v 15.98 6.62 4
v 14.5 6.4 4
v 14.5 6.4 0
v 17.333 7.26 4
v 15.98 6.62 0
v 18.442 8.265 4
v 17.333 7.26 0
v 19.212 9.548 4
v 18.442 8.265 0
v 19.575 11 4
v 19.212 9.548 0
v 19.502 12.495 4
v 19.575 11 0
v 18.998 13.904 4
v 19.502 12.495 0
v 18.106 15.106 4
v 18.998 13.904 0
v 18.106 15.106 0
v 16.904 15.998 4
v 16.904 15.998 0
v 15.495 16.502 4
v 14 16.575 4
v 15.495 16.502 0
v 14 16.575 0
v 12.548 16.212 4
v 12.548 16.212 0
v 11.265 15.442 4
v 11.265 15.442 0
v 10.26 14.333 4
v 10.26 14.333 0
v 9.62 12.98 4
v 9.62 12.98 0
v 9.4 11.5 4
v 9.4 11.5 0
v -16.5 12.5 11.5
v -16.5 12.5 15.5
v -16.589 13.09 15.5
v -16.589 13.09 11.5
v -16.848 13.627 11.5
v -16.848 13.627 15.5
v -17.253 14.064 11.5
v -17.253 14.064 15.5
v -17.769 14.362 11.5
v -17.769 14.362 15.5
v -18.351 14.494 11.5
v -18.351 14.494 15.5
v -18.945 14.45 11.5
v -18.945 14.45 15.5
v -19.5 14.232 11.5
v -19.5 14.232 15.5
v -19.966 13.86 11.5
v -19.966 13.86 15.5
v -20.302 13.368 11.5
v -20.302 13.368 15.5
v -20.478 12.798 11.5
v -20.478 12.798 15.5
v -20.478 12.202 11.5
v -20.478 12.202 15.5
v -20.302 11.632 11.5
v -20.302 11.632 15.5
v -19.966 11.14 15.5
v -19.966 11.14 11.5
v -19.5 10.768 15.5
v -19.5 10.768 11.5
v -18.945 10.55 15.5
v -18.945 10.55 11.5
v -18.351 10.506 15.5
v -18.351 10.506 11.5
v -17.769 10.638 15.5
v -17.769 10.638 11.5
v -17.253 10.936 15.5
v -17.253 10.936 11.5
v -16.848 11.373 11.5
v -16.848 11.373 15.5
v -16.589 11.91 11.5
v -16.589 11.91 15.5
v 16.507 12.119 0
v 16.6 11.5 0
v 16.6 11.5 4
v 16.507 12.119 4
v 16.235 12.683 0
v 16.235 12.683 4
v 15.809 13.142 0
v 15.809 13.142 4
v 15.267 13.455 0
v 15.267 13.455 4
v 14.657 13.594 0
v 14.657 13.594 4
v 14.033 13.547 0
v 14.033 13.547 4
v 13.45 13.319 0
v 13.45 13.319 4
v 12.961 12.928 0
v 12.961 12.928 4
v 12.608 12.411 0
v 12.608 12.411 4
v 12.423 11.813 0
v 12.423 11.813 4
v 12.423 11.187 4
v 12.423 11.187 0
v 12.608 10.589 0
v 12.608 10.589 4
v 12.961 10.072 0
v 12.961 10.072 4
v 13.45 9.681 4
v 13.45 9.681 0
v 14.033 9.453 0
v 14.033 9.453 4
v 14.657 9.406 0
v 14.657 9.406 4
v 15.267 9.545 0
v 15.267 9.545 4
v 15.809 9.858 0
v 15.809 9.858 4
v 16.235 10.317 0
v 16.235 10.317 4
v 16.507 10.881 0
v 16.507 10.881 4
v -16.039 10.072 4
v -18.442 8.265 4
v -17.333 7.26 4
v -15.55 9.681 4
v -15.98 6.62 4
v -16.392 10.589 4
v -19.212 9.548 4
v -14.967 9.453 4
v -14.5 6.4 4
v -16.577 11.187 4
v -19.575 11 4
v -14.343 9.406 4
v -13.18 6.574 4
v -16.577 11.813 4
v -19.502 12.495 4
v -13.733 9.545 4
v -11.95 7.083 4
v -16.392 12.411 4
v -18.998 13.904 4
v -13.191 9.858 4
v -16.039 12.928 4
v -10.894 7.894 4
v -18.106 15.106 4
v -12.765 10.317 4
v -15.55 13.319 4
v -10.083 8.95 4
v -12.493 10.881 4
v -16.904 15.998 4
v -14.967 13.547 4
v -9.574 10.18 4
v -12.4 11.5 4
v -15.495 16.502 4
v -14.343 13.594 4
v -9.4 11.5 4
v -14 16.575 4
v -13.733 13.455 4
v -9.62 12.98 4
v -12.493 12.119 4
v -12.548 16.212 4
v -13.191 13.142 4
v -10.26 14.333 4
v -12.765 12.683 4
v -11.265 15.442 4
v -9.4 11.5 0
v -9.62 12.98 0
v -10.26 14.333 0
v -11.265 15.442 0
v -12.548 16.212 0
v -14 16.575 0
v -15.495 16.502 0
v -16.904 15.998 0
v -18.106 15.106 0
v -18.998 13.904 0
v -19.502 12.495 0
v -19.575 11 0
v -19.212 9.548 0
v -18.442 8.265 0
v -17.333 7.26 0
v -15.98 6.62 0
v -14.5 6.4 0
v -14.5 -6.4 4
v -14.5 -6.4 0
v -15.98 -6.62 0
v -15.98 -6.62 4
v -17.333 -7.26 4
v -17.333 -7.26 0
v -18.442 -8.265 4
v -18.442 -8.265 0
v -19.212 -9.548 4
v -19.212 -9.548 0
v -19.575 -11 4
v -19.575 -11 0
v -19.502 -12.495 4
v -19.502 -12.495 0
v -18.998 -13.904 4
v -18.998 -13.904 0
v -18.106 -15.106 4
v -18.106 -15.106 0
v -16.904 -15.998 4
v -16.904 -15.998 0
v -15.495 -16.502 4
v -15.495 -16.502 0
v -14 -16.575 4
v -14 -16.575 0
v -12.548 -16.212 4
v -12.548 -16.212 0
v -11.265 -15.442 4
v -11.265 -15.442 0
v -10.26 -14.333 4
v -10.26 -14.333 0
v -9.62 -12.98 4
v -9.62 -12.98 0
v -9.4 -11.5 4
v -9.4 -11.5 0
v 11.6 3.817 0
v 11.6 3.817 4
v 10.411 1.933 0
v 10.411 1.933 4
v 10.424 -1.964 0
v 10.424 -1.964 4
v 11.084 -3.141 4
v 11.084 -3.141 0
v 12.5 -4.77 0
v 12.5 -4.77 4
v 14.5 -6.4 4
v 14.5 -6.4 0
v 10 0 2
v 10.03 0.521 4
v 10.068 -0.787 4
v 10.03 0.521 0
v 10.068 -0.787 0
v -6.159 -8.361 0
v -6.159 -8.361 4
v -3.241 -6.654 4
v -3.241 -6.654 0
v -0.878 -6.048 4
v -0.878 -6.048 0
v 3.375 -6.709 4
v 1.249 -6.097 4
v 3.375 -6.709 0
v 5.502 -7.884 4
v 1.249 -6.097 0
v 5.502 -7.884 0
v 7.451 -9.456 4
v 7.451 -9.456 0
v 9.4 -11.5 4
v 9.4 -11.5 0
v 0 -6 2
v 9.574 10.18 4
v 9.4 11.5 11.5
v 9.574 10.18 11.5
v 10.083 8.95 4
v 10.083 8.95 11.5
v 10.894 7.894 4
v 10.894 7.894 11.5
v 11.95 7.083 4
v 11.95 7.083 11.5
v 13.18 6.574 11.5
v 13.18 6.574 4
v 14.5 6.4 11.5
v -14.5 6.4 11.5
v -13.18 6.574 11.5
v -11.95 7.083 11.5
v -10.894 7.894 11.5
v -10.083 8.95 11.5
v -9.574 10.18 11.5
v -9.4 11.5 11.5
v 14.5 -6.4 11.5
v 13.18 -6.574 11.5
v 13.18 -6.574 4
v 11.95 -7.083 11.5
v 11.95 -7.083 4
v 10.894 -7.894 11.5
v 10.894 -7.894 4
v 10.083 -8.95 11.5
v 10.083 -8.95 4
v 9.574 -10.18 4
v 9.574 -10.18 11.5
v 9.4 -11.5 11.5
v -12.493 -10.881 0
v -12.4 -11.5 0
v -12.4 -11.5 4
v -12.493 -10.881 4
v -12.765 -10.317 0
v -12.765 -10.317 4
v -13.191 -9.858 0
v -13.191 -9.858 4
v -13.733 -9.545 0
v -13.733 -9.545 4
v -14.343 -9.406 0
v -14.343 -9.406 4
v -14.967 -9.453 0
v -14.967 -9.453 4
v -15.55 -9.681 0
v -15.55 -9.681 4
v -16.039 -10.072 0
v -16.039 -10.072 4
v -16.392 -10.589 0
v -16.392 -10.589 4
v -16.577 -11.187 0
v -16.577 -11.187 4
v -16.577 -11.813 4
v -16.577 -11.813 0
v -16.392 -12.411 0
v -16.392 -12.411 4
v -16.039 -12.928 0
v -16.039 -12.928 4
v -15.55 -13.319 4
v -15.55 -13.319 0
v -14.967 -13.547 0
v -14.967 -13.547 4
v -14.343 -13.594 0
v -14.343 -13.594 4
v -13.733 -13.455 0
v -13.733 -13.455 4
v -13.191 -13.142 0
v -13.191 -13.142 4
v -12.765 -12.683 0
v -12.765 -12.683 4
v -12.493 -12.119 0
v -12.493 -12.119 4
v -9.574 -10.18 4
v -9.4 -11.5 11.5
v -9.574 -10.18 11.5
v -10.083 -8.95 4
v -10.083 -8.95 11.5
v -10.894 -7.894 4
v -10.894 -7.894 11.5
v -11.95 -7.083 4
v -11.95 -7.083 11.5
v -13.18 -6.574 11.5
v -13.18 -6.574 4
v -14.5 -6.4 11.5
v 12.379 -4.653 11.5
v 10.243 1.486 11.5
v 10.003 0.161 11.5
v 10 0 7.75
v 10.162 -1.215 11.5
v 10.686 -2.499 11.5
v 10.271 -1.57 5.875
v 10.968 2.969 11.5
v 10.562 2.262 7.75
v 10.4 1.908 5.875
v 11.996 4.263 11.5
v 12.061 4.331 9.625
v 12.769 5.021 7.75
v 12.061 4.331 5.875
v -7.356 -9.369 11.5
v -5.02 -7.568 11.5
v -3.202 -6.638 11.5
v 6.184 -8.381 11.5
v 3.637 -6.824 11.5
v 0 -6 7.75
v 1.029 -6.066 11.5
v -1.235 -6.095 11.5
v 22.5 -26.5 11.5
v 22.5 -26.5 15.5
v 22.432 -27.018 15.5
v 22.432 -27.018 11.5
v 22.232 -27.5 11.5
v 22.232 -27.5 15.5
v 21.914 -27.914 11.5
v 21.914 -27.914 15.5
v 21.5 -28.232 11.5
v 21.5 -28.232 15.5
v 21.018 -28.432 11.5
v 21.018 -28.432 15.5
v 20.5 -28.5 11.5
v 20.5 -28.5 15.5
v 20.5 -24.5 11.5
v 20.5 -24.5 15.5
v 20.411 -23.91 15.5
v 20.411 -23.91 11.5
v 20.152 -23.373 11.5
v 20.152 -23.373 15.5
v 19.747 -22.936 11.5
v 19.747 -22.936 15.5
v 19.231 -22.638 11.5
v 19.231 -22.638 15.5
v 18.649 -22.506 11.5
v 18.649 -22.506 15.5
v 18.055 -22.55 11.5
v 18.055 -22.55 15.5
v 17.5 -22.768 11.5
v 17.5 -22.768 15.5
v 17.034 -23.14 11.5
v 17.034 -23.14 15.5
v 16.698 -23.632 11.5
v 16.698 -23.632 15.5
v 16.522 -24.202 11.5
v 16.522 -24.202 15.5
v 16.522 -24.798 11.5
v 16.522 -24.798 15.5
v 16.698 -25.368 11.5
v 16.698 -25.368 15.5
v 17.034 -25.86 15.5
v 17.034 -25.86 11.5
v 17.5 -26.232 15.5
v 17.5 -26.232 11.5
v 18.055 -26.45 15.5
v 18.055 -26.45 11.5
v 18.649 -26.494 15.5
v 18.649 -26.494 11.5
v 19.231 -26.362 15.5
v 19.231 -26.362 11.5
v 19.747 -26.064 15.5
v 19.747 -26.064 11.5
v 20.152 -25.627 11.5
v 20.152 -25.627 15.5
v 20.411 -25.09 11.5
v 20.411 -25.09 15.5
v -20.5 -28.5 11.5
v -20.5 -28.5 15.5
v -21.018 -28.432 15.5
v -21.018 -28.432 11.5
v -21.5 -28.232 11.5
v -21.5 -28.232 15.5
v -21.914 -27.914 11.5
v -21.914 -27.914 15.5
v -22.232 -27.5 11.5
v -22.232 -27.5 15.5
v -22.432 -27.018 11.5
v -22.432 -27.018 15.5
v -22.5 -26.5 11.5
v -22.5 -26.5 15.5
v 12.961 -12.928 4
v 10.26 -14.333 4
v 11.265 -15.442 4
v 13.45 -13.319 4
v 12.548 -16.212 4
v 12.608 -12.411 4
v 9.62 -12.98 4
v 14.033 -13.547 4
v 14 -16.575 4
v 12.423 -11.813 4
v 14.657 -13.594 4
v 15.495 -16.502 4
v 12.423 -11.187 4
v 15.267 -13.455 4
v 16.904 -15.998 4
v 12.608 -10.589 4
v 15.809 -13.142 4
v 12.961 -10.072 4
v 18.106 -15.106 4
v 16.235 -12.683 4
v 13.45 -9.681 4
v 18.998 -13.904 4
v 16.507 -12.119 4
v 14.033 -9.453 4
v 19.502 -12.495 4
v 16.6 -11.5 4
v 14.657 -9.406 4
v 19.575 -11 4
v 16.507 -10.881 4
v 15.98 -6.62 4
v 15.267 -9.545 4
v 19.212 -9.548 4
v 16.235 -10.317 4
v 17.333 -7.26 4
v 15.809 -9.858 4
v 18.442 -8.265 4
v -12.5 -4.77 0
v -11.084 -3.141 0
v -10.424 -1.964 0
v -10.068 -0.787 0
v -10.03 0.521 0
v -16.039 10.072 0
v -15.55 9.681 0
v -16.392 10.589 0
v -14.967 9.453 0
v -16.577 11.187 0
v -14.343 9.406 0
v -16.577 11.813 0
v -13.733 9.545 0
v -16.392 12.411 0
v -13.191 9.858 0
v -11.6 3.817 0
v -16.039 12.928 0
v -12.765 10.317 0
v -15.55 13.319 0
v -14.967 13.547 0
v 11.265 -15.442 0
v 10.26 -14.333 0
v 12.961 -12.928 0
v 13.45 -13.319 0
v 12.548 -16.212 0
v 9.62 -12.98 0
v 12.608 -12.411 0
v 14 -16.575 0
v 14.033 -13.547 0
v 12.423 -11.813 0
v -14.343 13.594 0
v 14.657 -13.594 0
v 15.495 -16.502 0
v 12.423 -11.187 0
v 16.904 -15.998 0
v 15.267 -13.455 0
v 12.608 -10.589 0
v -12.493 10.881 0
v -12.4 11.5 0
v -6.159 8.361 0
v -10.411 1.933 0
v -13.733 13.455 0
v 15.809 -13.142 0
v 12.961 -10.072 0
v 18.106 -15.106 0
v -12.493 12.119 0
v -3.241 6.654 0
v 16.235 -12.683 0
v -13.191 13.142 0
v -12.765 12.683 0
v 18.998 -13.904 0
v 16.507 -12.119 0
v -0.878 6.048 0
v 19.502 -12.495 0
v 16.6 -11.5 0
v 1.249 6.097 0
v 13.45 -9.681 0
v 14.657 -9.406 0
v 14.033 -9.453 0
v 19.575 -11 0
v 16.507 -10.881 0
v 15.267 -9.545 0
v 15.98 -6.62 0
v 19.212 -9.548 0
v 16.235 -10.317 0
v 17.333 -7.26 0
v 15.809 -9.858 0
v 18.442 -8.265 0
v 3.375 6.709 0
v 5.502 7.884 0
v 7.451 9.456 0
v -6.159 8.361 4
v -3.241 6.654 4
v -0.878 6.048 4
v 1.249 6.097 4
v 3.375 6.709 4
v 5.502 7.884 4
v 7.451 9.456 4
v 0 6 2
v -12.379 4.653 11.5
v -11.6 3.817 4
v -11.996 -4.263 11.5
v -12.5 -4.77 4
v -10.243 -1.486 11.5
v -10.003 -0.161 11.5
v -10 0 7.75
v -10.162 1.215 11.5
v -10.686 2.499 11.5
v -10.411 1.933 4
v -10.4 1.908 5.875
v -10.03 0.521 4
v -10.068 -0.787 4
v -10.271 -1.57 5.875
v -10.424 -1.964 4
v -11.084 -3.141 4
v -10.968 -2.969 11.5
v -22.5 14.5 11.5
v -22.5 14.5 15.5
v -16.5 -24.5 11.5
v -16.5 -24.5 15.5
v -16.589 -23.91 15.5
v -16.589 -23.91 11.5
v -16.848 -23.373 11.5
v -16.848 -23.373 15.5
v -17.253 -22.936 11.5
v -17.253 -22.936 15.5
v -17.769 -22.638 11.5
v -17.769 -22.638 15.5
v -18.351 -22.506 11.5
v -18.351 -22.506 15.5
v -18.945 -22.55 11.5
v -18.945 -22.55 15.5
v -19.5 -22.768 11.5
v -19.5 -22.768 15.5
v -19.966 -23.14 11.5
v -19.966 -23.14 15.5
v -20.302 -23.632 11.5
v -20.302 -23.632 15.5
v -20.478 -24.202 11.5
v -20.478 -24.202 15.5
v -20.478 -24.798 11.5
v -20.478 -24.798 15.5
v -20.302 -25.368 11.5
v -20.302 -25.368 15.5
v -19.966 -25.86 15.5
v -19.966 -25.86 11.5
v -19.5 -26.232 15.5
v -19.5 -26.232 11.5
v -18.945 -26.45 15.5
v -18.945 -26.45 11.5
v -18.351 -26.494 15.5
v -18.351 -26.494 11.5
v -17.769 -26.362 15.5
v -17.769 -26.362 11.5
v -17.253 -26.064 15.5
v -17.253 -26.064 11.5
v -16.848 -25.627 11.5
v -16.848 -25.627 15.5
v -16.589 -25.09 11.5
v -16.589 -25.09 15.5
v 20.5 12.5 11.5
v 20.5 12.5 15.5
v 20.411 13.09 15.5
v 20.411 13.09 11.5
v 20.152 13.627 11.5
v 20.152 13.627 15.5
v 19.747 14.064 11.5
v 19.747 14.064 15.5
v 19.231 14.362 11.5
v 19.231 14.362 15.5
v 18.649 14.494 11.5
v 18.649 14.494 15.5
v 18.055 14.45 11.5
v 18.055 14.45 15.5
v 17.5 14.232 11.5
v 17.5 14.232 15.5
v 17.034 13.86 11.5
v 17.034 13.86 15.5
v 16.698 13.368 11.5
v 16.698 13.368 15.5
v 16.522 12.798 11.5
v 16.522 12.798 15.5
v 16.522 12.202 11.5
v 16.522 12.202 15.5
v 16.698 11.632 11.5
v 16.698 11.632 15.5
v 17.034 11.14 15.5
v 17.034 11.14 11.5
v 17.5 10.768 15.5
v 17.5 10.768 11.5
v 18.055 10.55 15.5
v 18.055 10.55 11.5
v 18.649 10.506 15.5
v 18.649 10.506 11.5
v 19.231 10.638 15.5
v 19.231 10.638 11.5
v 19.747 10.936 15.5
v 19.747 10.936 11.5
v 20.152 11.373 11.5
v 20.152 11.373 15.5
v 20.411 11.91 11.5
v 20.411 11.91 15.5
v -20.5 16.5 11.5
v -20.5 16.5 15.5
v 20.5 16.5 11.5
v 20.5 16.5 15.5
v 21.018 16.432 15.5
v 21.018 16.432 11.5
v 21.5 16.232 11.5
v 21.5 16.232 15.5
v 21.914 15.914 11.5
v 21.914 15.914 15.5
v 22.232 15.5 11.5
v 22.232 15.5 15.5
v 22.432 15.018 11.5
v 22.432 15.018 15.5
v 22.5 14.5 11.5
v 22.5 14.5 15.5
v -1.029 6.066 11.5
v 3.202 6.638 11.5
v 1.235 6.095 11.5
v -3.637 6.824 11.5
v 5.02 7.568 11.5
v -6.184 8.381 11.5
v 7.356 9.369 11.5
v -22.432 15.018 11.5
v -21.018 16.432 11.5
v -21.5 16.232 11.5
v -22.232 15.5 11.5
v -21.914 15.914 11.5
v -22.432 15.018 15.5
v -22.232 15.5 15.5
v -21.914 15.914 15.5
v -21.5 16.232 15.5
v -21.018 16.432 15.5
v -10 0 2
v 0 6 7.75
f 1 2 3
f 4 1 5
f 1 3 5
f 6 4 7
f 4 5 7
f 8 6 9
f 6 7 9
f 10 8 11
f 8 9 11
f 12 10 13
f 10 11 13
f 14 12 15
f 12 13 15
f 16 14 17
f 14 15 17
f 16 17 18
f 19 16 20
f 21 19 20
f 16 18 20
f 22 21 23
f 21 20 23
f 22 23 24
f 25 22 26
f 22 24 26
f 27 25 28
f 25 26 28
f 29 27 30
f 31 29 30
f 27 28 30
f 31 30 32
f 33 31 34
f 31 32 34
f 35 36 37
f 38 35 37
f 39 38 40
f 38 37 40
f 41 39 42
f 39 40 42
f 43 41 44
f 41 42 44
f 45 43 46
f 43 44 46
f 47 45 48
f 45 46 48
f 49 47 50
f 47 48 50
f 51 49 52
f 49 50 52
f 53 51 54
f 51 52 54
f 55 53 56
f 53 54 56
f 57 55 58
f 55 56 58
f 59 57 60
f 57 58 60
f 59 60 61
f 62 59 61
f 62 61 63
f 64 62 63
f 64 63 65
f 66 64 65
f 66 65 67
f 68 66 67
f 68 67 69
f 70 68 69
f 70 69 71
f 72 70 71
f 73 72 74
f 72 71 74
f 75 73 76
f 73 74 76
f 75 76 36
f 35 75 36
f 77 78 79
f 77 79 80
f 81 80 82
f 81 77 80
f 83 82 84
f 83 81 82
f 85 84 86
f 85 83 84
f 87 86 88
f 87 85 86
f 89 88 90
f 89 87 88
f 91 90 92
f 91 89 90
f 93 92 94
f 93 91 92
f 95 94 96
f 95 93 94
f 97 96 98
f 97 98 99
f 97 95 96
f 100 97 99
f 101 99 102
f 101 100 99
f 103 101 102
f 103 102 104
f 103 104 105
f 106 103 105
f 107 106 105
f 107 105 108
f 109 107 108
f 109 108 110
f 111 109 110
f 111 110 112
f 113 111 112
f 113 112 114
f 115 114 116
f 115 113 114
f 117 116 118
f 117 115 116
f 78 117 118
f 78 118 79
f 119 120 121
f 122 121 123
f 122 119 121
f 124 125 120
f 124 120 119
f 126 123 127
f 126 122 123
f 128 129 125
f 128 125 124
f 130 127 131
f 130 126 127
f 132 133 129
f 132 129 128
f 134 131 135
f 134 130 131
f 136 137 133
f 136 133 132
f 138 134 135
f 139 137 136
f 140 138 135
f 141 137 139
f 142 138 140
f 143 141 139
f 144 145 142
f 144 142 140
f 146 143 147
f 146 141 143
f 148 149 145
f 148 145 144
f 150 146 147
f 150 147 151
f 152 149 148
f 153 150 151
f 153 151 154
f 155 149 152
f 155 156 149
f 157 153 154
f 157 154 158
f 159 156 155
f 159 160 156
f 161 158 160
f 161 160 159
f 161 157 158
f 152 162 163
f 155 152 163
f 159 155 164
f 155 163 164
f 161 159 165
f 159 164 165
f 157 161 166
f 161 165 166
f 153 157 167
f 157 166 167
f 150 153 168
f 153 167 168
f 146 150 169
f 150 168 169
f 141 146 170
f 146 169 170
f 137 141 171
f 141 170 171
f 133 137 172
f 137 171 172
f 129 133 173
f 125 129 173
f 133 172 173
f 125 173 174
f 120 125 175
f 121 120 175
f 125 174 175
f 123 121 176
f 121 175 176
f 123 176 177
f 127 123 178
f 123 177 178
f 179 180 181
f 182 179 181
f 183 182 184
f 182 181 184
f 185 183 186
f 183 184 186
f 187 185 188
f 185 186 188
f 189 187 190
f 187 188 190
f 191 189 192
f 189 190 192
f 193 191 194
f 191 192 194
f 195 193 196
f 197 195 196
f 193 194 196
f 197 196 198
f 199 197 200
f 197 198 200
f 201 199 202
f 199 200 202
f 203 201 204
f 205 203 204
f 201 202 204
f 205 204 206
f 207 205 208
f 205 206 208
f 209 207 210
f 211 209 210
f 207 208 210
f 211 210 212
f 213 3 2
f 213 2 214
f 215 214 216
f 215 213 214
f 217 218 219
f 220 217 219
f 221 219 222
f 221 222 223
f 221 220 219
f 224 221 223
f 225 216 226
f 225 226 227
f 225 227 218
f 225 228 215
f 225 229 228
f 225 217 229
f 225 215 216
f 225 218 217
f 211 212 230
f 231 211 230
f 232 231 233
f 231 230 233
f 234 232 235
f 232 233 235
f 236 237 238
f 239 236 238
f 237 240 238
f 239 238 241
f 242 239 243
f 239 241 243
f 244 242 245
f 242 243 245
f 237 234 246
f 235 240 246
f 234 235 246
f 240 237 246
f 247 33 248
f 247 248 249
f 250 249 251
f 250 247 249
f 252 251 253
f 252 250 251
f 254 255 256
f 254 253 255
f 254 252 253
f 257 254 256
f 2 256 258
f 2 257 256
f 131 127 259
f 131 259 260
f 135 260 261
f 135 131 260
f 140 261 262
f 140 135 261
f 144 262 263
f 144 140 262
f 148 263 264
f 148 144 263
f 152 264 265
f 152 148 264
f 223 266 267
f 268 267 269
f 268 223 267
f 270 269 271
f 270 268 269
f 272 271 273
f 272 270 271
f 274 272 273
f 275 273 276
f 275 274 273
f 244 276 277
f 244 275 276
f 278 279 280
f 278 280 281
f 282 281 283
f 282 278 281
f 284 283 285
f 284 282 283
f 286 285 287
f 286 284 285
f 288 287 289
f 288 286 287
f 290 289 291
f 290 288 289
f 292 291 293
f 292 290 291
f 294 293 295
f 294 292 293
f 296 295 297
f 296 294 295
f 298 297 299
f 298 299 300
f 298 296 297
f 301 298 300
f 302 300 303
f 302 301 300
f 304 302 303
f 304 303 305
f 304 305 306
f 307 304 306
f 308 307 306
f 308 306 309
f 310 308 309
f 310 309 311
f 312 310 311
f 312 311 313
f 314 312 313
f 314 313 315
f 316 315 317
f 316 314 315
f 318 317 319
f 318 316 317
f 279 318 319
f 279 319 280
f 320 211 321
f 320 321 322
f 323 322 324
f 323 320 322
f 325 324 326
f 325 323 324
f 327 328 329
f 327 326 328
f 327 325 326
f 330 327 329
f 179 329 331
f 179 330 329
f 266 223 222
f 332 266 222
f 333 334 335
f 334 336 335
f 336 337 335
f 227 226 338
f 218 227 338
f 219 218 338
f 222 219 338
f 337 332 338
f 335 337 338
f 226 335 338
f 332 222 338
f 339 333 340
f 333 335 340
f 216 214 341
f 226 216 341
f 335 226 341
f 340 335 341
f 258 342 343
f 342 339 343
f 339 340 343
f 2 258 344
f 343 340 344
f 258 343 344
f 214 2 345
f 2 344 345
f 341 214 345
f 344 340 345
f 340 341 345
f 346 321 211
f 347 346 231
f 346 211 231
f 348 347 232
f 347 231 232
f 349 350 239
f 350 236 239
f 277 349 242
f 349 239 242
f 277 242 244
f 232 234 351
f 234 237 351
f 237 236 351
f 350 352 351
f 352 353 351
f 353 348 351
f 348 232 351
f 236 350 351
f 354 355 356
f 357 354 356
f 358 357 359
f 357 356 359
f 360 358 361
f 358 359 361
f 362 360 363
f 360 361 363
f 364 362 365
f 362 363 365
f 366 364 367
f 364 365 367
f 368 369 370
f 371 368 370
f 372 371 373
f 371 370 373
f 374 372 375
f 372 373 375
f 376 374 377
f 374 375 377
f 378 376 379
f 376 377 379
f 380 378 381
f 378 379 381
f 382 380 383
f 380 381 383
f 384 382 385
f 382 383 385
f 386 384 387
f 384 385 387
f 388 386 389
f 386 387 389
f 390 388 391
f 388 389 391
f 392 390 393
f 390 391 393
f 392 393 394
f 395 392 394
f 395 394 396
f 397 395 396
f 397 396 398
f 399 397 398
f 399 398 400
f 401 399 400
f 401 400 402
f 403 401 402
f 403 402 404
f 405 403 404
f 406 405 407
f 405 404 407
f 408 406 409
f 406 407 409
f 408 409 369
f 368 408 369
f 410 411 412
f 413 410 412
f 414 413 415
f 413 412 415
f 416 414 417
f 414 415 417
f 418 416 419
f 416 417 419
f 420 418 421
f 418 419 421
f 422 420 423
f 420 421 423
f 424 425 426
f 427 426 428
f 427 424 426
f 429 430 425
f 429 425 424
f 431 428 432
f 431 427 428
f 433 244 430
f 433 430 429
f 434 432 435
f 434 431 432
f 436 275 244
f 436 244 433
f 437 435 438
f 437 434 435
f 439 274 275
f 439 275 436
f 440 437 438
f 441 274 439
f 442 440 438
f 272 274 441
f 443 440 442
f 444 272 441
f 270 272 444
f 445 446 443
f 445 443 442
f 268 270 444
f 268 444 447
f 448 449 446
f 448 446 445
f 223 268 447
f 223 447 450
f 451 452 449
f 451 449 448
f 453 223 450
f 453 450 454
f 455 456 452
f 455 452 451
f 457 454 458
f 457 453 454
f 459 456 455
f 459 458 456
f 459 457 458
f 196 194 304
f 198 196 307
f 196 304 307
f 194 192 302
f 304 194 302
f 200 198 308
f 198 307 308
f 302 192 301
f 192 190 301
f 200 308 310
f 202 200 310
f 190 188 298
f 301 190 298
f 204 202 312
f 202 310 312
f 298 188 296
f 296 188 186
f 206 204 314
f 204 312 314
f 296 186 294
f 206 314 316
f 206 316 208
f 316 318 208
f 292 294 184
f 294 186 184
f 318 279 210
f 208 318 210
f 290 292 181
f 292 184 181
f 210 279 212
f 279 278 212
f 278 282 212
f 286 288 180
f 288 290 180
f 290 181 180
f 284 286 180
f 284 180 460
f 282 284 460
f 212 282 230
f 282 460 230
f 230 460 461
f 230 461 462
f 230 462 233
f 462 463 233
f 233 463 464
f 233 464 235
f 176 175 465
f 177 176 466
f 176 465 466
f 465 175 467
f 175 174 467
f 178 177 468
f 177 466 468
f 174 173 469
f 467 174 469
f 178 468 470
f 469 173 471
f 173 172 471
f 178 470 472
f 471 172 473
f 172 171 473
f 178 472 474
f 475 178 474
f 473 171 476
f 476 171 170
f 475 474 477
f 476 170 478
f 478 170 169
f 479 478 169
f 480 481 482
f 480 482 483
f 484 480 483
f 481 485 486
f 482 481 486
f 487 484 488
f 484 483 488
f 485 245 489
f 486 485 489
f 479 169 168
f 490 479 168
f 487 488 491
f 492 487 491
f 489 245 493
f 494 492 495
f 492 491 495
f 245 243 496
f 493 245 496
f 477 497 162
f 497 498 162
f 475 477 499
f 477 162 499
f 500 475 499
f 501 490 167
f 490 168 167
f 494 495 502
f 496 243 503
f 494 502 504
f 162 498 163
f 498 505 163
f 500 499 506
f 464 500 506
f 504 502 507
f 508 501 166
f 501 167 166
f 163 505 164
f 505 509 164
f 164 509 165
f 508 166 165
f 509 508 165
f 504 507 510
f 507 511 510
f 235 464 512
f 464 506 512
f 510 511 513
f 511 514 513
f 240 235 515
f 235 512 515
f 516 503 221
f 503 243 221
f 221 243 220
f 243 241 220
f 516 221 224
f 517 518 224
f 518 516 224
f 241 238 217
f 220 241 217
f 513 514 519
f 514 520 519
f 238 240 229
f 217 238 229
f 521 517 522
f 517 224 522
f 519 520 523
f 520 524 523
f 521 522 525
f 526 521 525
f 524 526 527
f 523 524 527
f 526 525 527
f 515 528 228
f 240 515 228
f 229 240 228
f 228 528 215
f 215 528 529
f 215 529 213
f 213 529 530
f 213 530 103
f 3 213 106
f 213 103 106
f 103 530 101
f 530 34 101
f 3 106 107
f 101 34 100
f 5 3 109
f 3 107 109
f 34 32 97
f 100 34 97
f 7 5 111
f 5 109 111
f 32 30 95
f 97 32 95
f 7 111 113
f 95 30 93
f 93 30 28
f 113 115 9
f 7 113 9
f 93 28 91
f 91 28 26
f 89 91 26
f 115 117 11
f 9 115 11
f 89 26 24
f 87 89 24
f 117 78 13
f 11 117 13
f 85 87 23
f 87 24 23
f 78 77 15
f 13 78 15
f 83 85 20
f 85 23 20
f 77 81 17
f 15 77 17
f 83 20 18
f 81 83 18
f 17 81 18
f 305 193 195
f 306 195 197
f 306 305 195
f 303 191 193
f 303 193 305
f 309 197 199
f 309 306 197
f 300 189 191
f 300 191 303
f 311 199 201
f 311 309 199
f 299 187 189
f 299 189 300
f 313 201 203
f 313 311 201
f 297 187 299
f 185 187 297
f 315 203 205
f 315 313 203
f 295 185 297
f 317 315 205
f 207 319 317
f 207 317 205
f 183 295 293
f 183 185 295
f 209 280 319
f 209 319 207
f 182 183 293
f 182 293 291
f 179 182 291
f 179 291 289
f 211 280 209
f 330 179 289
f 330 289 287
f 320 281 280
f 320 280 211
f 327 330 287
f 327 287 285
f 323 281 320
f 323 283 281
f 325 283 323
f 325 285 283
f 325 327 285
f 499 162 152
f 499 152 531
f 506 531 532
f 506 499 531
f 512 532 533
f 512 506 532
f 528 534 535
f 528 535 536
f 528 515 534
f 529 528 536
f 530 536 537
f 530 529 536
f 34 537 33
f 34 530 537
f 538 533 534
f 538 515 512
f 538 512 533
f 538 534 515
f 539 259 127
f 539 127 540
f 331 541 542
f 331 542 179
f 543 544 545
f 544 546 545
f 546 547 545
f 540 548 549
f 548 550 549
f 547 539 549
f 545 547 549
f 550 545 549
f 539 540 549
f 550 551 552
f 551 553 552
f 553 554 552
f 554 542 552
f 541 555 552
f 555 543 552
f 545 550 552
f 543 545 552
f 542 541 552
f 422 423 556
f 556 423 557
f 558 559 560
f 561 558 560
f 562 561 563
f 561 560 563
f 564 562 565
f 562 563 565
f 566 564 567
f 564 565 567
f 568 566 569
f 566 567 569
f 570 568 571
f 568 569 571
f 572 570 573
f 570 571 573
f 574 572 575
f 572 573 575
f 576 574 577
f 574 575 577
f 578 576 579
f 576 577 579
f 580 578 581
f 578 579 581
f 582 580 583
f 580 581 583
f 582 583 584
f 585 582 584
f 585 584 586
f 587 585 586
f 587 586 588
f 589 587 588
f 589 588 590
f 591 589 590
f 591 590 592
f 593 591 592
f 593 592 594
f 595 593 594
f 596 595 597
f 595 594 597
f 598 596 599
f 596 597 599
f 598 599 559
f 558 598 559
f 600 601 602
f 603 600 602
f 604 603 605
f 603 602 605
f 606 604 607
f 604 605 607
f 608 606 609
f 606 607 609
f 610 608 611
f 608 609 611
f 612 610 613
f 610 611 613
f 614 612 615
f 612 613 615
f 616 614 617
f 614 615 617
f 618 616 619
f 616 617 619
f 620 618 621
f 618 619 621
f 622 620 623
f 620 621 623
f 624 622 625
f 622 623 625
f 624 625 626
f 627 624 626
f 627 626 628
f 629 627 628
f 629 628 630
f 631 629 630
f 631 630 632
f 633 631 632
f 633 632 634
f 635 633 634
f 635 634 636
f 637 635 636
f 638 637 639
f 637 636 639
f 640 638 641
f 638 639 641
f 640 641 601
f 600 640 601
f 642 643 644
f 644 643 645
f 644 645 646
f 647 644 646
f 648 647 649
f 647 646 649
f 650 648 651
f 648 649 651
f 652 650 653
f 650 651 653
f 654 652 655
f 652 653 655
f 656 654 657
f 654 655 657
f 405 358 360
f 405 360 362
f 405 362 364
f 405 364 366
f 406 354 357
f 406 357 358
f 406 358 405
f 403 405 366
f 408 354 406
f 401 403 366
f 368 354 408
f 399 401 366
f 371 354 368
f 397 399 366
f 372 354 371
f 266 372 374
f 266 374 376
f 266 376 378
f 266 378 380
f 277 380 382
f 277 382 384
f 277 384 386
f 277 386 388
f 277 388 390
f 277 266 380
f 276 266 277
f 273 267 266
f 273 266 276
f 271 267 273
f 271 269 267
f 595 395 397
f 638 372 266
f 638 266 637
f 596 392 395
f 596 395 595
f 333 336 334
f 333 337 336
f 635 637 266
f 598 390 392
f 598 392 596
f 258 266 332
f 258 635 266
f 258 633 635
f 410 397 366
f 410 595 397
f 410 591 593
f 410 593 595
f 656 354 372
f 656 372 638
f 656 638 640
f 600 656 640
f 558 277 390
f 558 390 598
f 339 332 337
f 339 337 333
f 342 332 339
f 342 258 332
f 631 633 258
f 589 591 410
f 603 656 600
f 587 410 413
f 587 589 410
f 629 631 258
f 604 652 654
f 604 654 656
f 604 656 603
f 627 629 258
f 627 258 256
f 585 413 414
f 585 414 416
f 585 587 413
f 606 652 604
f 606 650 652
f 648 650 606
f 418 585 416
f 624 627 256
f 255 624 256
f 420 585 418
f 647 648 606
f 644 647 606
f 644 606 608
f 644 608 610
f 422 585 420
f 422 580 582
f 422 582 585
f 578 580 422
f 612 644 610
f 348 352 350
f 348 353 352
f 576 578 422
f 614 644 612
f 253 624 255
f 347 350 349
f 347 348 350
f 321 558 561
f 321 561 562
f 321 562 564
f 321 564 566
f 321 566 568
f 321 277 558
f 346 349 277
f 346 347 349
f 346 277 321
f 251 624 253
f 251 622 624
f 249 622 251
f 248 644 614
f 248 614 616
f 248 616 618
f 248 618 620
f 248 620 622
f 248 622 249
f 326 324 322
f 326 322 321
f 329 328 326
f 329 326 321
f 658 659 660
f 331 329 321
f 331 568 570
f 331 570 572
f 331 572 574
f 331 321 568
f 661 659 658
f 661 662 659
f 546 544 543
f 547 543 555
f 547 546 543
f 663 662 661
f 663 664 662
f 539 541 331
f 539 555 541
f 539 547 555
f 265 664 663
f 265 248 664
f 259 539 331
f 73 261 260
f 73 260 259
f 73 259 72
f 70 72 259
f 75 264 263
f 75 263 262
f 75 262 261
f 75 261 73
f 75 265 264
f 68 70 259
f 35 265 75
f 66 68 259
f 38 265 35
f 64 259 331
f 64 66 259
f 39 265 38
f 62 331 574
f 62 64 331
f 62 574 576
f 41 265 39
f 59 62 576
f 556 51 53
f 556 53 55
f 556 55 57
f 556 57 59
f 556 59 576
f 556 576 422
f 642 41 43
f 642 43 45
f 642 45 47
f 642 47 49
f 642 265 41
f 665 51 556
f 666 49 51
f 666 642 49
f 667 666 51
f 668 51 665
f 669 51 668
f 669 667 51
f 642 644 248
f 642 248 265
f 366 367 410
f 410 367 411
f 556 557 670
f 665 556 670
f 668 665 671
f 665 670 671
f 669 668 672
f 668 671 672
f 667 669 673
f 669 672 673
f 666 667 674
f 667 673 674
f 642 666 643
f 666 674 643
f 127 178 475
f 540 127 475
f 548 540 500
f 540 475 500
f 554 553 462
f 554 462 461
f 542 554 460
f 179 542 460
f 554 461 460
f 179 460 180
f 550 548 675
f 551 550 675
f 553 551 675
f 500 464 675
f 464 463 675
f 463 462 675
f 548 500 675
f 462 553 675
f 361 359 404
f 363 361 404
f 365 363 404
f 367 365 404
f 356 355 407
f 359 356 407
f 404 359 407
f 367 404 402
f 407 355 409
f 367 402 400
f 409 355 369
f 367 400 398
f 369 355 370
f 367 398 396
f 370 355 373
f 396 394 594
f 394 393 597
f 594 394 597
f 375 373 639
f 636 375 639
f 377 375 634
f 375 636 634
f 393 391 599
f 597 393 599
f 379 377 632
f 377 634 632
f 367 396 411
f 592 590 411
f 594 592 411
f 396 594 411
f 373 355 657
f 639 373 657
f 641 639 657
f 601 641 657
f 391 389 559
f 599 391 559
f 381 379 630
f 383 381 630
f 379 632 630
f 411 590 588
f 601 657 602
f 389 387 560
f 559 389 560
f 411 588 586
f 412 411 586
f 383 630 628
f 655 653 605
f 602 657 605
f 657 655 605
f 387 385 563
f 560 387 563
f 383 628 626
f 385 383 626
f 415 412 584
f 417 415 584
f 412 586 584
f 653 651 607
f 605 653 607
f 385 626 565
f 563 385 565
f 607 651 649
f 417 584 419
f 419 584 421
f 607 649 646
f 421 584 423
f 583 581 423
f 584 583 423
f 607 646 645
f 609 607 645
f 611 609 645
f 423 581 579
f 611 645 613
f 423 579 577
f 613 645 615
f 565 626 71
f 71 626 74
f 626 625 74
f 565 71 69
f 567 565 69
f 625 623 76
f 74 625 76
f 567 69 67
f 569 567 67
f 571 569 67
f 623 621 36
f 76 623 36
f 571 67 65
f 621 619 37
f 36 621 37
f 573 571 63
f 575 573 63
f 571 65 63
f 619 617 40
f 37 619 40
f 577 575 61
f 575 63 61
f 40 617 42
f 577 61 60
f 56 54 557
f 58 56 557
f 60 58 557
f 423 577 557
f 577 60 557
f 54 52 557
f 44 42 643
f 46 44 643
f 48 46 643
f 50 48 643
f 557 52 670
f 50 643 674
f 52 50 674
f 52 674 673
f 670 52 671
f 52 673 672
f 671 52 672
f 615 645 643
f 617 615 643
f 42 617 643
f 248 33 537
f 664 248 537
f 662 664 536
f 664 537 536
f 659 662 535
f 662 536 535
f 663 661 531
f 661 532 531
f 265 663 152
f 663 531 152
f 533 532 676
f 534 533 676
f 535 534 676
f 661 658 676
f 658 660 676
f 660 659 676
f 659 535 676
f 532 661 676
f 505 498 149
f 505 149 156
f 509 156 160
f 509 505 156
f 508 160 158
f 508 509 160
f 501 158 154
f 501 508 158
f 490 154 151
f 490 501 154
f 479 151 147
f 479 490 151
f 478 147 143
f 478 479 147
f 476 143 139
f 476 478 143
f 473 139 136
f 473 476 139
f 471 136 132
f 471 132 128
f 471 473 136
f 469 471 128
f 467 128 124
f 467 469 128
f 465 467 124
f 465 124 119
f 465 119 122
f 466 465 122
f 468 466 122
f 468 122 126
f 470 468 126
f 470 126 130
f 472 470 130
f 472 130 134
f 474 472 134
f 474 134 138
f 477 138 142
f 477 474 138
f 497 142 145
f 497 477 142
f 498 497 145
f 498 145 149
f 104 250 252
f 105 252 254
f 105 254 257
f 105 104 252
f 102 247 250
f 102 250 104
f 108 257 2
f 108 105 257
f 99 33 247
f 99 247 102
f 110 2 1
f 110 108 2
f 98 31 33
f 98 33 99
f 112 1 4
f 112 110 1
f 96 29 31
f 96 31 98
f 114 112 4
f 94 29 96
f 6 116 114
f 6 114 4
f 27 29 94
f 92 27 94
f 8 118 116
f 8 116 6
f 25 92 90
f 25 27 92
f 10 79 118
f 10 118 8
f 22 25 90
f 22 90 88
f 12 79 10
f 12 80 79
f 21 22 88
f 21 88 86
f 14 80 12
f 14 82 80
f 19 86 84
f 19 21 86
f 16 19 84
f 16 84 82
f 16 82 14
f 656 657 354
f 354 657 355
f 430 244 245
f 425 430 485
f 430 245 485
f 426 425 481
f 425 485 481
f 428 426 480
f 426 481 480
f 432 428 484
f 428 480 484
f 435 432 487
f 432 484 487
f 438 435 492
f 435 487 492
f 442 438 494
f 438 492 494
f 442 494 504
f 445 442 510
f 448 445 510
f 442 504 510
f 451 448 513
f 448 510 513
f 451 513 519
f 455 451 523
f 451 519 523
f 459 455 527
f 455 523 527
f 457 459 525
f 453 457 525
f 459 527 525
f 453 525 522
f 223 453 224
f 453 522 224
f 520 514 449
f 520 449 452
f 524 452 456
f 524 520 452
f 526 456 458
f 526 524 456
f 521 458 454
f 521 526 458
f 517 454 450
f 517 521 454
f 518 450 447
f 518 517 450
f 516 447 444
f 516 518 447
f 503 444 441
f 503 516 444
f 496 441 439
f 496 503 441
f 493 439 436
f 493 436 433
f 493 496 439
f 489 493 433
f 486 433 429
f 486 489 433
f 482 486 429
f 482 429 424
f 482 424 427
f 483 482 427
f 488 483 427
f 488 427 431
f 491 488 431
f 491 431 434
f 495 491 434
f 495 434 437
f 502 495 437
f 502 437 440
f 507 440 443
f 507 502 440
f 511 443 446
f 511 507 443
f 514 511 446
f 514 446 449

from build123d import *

# Parameters (mm, degrees)
SKETCH_1_R      = 5.1
SKETCH_1_R_2    = 2.1
EXTRUDE_1_DEPTH = 4
EXTRUDE_2_DEPTH = 11.5
SKETCH_3_R      = 2
EXTRUDE_3_DEPTH = 4


with BuildPart() as part:
    # 草圖1 → 填料-伸長1 (new body)
    # profile 1 of 5: a face of its own
    with BuildSketch(Plane.XY):
        with Locations((-14.5, 11.5)):
            Circle(SKETCH_1_R)
        with Locations((-14.5, 11.5)):
            Circle(SKETCH_1_R_2, mode=Mode.SUBTRACT)
    # profile 2 of 5: a face of its own
    with BuildSketch(Plane.XY):
        with BuildLine():
            add(Edge.make_bspline(
                [(-9.4, 11.5), (0, 0.5), (9.4, 11.5)],
                knots=[0, 0, 0, 1, 1, 1], degree=2))
            ThreePointArc((-9.4, 11.5), (-10.893755416, 7.893755416), (-14.5, 6.4))
            add(Edge.make_bspline(
                [(-14.5, 6.4), (-5.5, 0), (-14.5, -6.4)],
                knots=[0, 0, 0, 1, 1, 1], degree=2))
            ThreePointArc((-14.5, -6.4), (-10.893755416, -7.893755416), (-9.4, -11.5))
            add(Edge.make_bspline(
                [(-9.4, -11.5), (0, -0.5), (9.4, -11.5)],
                knots=[0, 0, 0, 1, 1, 1], degree=2))
            ThreePointArc((9.4, -11.5), (10.893755416, -7.893755416), (14.5, -6.4))
            add(Edge.make_bspline(
                [(14.5, 6.4), (5.5, 0), (14.5, -6.4)],
                knots=[0, 0, 0, 1, 1, 1], degree=2))
            ThreePointArc((14.5, 6.4), (10.893755416, 7.893755416), (9.4, 11.5))
        make_face()
    # profile 3 of 5: a face of its own
    with BuildSketch(Plane.XY):
        with Locations((14.5, 11.5)):
            Circle(SKETCH_1_R)
        with Locations((14.5, 11.5)):
            Circle(SKETCH_1_R_2, mode=Mode.SUBTRACT)
    # profile 4 of 5: a face of its own
    with BuildSketch(Plane.XY):
        with Locations((14.5, -11.5)):
            Circle(SKETCH_1_R)
        with Locations((14.5, -11.5)):
            Circle(SKETCH_1_R_2, mode=Mode.SUBTRACT)
    # profile 5 of 5: a face of its own
    with BuildSketch(Plane.XY):
        with Locations((-14.5, -11.5)):
            Circle(SKETCH_1_R)
        with Locations((-14.5, -11.5)):
            Circle(SKETCH_1_R_2, mode=Mode.SUBTRACT)
    extrude(amount=EXTRUDE_1_DEPTH)

    # 草圖2 → 填料-伸長2 (add)
    with BuildSketch(Plane.XY.offset(4)):
        with BuildLine():
            ThreePointArc((-14.5, 6.4), (-10.893755416, 7.893755416), (-9.4, 11.5))
            add(Edge.make_bspline(
                [(9.4, 11.5), (0, 0.5), (-9.4, 11.5)],
                knots=[0, 0, 0, 1, 1, 1], degree=2))
            ThreePointArc((9.4, 11.5), (10.893755425, 7.893755407), (14.500000025, 6.400000018))
            add(Edge.make_bspline(
                [(14.5, -6.4), (5.499999987, 9e-09), (14.500000025, 6.400000018)],
                knots=[0, 0, 0, 1, 1, 1], degree=2))
            ThreePointArc((14.5, -6.4), (10.893755423, -7.893755409), (9.399999984, -11.499999981))
            add(Edge.make_bspline(
                [(-9.4, -11.5), (-8e-09, -0.500000009), (9.399999984, -11.499999981)],
                knots=[0, 0, 0, 1, 1, 1], degree=2))
            ThreePointArc((-9.4, -11.5), (-10.893755425, -7.893755407), (-14.500000025, -6.400000018))
            add(Edge.make_bspline(
                [(-14.5, 6.4), (-5.499999987, -9e-09), (-14.500000025, -6.400000018)],
                knots=[0, 0, 0, 1, 1, 1], degree=2))
        make_face()
    extrude(amount=EXTRUDE_2_DEPTH)

    # 草圖3 → 填料-伸長3 (add)
    with BuildSketch(Plane.XY.offset(15.5)):
        with BuildLine():
            Line((-20.5, 16.5), (20.5, 16.5))
            ThreePointArc((20.5, 16.5), (21.914213562, 15.914213562), (22.5, 14.5))
            Line((22.5, 14.5), (22.5, -26.5))
            ThreePointArc((22.5, -26.5), (21.914213562, -27.914213562), (20.5, -28.5))
            Line((20.5, -28.5), (-20.5, -28.5))
            ThreePointArc((-20.5, -28.5), (-21.914213562, -27.914213562), (-22.5, -26.5))
            Line((-22.5, -26.5), (-22.5, 14.5))
            ThreePointArc((-22.5, 14.5), (-21.914213562, 15.914213562), (-20.5, 16.5))
        make_face()
        with Locations((-18.5, 12.5)):
            Circle(SKETCH_3_R, mode=Mode.SUBTRACT)
        with Locations((-18.5, -24.5)):
            Circle(SKETCH_3_R, mode=Mode.SUBTRACT)
        with Locations((18.5, -24.5)):
            Circle(SKETCH_3_R, mode=Mode.SUBTRACT)
        with Locations((18.5, 12.5)):
            Circle(SKETCH_3_R, mode=Mode.SUBTRACT)
    extrude(amount=-EXTRUDE_3_DEPTH)


solid = part.part
